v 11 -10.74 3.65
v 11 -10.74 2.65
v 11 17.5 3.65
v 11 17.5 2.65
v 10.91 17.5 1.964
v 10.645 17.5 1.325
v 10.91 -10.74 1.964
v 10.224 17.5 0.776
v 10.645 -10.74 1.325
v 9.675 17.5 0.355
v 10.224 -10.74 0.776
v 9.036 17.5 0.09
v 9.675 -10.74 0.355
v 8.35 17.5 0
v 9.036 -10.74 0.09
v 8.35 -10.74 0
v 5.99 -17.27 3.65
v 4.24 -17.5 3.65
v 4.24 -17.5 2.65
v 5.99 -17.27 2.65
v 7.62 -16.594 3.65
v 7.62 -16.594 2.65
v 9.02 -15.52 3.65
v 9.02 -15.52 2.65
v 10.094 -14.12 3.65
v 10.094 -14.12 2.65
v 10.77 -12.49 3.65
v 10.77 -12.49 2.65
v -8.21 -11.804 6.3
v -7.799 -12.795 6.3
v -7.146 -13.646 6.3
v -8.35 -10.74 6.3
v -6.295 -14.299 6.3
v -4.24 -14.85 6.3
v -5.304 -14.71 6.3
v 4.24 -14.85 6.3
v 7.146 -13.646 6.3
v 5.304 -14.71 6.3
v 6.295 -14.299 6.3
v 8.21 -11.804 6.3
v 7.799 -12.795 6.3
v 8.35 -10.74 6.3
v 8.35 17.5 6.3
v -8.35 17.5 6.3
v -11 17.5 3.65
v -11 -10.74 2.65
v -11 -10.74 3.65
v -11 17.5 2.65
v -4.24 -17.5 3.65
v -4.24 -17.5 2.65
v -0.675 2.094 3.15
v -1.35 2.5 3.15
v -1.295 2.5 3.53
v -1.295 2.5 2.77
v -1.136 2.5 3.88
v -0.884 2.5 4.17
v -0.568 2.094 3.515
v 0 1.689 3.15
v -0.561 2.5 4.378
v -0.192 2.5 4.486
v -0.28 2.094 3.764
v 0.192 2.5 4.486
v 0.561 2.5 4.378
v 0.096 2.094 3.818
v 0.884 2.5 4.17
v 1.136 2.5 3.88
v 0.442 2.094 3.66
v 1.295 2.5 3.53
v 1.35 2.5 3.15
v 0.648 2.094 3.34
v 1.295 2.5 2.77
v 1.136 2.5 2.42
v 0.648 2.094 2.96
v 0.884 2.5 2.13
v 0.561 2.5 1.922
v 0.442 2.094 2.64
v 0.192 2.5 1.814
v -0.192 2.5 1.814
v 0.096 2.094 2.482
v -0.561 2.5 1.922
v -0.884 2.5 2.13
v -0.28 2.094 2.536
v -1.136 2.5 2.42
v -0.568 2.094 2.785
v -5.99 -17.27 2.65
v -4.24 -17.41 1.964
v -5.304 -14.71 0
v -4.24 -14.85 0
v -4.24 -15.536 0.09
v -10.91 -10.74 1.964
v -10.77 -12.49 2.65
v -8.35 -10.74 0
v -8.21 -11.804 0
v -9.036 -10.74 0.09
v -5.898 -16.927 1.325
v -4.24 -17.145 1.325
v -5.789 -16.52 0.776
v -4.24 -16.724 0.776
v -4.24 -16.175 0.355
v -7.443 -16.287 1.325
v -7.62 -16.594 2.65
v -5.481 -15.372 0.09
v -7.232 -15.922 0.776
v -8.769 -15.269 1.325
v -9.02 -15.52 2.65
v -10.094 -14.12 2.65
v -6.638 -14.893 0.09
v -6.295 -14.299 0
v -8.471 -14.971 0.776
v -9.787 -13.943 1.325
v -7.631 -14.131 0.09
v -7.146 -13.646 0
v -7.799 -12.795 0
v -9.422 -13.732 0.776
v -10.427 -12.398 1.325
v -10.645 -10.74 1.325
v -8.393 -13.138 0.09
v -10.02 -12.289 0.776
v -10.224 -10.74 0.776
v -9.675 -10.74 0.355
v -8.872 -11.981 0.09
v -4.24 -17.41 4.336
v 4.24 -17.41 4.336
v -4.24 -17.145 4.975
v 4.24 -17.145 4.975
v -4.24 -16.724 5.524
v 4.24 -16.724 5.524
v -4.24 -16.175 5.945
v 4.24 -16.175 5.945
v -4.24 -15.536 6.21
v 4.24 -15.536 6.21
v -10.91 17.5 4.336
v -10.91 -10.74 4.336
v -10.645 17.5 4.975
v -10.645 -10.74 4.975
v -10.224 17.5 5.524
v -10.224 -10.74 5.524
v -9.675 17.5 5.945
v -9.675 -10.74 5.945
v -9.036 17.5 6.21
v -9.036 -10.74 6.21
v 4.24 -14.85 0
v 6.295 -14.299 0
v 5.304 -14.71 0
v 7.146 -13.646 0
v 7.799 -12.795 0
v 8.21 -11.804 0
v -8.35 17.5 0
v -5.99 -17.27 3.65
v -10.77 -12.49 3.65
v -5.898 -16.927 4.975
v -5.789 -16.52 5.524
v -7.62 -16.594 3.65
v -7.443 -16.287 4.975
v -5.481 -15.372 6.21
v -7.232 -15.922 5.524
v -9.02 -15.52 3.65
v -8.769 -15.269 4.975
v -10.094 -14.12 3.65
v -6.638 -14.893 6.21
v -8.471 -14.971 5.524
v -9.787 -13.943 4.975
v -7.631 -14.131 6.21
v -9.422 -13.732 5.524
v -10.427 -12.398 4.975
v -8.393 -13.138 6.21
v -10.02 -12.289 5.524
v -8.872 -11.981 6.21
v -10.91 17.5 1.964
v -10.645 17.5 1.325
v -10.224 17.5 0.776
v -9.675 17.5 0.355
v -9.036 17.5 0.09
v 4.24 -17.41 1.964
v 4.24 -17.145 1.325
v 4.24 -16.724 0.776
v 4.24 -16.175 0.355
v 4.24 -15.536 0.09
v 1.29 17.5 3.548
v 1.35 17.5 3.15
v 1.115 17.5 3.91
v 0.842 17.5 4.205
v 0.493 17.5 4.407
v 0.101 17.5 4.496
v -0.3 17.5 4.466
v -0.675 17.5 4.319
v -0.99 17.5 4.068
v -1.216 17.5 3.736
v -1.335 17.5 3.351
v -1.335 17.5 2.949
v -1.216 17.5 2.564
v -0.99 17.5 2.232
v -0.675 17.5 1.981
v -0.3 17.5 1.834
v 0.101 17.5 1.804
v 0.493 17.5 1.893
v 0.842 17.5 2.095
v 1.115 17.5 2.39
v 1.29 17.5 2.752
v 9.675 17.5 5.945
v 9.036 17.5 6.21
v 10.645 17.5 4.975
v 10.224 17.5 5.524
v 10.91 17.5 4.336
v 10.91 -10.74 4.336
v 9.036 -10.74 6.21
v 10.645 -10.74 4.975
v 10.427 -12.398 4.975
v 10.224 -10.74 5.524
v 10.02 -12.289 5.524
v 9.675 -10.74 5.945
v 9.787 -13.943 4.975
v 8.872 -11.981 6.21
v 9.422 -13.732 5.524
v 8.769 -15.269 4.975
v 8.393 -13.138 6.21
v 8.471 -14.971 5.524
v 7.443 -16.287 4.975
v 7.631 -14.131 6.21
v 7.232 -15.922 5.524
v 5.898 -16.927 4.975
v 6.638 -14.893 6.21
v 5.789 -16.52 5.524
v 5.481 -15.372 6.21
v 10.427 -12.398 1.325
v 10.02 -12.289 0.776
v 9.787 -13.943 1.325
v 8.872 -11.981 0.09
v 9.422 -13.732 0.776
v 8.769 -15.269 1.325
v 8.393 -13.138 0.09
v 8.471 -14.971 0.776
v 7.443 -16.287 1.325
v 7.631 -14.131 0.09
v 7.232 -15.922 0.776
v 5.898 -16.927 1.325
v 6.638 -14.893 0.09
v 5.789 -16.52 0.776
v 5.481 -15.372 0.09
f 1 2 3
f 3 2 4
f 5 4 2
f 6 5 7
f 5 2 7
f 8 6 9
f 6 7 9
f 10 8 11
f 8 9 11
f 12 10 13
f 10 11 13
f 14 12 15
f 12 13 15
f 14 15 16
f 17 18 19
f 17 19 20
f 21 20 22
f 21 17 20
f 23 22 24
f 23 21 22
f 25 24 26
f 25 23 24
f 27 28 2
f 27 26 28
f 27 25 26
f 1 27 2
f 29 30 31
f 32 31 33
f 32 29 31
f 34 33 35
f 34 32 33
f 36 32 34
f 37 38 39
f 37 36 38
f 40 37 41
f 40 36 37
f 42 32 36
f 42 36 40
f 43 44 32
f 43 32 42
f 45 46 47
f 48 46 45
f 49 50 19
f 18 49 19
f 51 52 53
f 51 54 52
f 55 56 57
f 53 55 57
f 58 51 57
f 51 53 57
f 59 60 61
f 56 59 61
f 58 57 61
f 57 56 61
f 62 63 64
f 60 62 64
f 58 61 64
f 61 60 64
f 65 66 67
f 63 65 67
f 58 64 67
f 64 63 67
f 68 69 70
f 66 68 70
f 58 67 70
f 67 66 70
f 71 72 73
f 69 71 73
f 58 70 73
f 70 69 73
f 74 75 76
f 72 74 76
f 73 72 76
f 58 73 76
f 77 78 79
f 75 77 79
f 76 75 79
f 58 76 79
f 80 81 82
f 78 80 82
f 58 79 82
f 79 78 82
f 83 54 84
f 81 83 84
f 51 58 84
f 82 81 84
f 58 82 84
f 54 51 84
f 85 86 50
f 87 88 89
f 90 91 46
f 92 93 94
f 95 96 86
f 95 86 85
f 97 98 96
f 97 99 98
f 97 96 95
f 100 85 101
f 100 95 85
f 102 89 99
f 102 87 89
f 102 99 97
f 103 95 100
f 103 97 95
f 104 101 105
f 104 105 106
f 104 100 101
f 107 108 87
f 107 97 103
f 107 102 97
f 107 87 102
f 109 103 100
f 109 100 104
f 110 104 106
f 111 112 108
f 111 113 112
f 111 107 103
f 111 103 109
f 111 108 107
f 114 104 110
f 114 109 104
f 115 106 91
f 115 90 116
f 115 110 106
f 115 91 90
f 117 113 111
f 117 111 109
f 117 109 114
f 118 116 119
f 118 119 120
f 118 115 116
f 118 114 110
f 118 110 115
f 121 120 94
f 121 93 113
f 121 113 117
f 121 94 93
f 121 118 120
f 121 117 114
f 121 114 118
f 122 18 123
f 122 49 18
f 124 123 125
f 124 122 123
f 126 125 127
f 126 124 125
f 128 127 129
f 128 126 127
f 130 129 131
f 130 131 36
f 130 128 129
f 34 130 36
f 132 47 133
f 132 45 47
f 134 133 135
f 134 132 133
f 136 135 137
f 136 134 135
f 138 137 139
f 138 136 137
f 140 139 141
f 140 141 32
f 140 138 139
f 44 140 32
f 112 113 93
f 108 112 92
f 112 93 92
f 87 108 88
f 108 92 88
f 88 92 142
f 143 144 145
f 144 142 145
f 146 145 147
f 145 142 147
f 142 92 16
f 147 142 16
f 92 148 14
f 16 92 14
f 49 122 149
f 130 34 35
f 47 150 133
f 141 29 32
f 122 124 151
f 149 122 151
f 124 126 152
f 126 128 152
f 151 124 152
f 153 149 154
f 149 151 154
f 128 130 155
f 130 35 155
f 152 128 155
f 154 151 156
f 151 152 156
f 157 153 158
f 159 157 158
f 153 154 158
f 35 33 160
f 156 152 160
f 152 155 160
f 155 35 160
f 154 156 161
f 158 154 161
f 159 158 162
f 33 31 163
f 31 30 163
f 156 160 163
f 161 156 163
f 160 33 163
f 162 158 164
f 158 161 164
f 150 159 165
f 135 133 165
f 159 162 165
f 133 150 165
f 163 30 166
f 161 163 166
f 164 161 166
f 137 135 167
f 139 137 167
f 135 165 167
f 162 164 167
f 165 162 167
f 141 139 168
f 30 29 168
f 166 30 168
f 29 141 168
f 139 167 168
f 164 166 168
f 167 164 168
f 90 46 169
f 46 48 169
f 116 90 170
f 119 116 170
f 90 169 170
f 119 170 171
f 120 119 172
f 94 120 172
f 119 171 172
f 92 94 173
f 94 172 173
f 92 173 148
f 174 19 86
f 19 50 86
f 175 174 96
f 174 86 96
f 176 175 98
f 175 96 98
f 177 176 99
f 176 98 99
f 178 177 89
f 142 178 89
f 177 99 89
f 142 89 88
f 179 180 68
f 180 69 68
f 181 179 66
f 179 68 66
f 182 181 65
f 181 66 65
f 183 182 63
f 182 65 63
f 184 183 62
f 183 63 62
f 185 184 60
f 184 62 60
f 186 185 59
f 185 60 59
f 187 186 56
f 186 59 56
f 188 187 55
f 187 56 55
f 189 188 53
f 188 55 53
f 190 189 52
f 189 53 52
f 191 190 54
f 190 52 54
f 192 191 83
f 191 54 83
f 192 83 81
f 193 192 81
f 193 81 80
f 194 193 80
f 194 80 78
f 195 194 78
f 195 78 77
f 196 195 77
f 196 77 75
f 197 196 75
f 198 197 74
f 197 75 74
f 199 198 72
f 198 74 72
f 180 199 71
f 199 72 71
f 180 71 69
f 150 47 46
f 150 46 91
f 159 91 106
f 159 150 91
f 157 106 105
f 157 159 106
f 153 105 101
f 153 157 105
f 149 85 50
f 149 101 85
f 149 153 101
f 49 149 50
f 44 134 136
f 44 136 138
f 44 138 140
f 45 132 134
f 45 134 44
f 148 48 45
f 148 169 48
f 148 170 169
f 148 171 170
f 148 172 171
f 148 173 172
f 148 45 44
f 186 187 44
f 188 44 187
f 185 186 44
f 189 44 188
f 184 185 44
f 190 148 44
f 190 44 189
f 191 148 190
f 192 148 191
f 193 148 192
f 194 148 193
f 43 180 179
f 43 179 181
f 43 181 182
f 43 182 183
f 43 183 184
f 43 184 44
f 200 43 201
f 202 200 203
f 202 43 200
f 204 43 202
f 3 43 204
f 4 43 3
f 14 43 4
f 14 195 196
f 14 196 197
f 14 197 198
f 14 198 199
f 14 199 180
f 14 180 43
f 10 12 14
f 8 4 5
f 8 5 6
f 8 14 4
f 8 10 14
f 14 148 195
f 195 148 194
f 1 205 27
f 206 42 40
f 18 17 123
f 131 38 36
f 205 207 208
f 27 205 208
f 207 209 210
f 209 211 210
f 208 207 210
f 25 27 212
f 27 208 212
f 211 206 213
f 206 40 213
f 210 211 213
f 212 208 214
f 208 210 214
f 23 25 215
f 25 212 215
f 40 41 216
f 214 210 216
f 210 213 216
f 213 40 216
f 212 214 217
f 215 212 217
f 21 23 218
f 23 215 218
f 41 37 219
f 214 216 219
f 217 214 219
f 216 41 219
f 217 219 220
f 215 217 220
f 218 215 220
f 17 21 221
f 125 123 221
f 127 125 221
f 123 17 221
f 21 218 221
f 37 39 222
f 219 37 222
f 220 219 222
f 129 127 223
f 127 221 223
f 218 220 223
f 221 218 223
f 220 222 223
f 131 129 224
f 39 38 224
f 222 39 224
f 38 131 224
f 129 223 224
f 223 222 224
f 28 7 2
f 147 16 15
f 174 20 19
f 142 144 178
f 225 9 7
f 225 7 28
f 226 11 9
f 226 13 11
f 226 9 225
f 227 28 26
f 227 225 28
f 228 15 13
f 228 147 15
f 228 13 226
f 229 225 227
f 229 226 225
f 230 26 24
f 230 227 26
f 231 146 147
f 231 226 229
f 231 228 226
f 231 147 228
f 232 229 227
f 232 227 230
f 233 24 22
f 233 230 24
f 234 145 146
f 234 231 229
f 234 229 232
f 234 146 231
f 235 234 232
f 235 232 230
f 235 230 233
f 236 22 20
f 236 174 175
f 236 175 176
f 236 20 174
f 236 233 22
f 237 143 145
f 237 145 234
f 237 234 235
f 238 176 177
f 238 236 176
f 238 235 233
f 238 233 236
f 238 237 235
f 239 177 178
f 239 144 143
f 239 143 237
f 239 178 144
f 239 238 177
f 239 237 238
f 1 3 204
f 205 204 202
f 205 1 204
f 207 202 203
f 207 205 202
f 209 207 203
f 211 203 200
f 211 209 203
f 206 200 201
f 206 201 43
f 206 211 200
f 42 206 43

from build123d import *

# Parameters (mm, degrees)
F0_W     = 22
F0_H     = 35
F1_DEPTH = 6.3
F2_R     = 6.7597979746
F3_R     = 2.65
F5_D     = 2.7
F5_DEPTH = 15
F5_TIP   = 0.8111618357


with BuildPart() as f1:
    # F0 (on Top) → F1 (new body)
    with BuildSketch(Plane.XY):
        Rectangle(F0_W, F0_H)
    extrude(amount=F1_DEPTH)

    # F2
    f2_edges = [f1.edges().sort_by_distance(p)[0] for p in [
        (-11, -17.5, 3.15),
        (11, -17.5, 3.15),
    ]]
    fillet(f2_edges, radius=F2_R)

    # F3
    f3_edges = [f1.edges().sort_by_distance(p)[0] for p in [
        (-11, 3.379899, 6.3),
        (-11, 3.379899, 0),
    ]]
    fillet(f3_edges, radius=F3_R)

    # F5
    with Locations(Plane(origin=(0, 17.5, 0), x_dir=(-1, 0, 0), z_dir=(0, 1, 0))):
        with Locations((0, 3.15)):
            Hole(F5_D / 2, depth=F5_DEPTH)
            with Locations((0, 0, -(F5_DEPTH + F5_TIP / 2))):  # 118° drill point
                Cone(0, F5_D / 2, F5_TIP, mode=Mode.SUBTRACT)


solid = f1.part
